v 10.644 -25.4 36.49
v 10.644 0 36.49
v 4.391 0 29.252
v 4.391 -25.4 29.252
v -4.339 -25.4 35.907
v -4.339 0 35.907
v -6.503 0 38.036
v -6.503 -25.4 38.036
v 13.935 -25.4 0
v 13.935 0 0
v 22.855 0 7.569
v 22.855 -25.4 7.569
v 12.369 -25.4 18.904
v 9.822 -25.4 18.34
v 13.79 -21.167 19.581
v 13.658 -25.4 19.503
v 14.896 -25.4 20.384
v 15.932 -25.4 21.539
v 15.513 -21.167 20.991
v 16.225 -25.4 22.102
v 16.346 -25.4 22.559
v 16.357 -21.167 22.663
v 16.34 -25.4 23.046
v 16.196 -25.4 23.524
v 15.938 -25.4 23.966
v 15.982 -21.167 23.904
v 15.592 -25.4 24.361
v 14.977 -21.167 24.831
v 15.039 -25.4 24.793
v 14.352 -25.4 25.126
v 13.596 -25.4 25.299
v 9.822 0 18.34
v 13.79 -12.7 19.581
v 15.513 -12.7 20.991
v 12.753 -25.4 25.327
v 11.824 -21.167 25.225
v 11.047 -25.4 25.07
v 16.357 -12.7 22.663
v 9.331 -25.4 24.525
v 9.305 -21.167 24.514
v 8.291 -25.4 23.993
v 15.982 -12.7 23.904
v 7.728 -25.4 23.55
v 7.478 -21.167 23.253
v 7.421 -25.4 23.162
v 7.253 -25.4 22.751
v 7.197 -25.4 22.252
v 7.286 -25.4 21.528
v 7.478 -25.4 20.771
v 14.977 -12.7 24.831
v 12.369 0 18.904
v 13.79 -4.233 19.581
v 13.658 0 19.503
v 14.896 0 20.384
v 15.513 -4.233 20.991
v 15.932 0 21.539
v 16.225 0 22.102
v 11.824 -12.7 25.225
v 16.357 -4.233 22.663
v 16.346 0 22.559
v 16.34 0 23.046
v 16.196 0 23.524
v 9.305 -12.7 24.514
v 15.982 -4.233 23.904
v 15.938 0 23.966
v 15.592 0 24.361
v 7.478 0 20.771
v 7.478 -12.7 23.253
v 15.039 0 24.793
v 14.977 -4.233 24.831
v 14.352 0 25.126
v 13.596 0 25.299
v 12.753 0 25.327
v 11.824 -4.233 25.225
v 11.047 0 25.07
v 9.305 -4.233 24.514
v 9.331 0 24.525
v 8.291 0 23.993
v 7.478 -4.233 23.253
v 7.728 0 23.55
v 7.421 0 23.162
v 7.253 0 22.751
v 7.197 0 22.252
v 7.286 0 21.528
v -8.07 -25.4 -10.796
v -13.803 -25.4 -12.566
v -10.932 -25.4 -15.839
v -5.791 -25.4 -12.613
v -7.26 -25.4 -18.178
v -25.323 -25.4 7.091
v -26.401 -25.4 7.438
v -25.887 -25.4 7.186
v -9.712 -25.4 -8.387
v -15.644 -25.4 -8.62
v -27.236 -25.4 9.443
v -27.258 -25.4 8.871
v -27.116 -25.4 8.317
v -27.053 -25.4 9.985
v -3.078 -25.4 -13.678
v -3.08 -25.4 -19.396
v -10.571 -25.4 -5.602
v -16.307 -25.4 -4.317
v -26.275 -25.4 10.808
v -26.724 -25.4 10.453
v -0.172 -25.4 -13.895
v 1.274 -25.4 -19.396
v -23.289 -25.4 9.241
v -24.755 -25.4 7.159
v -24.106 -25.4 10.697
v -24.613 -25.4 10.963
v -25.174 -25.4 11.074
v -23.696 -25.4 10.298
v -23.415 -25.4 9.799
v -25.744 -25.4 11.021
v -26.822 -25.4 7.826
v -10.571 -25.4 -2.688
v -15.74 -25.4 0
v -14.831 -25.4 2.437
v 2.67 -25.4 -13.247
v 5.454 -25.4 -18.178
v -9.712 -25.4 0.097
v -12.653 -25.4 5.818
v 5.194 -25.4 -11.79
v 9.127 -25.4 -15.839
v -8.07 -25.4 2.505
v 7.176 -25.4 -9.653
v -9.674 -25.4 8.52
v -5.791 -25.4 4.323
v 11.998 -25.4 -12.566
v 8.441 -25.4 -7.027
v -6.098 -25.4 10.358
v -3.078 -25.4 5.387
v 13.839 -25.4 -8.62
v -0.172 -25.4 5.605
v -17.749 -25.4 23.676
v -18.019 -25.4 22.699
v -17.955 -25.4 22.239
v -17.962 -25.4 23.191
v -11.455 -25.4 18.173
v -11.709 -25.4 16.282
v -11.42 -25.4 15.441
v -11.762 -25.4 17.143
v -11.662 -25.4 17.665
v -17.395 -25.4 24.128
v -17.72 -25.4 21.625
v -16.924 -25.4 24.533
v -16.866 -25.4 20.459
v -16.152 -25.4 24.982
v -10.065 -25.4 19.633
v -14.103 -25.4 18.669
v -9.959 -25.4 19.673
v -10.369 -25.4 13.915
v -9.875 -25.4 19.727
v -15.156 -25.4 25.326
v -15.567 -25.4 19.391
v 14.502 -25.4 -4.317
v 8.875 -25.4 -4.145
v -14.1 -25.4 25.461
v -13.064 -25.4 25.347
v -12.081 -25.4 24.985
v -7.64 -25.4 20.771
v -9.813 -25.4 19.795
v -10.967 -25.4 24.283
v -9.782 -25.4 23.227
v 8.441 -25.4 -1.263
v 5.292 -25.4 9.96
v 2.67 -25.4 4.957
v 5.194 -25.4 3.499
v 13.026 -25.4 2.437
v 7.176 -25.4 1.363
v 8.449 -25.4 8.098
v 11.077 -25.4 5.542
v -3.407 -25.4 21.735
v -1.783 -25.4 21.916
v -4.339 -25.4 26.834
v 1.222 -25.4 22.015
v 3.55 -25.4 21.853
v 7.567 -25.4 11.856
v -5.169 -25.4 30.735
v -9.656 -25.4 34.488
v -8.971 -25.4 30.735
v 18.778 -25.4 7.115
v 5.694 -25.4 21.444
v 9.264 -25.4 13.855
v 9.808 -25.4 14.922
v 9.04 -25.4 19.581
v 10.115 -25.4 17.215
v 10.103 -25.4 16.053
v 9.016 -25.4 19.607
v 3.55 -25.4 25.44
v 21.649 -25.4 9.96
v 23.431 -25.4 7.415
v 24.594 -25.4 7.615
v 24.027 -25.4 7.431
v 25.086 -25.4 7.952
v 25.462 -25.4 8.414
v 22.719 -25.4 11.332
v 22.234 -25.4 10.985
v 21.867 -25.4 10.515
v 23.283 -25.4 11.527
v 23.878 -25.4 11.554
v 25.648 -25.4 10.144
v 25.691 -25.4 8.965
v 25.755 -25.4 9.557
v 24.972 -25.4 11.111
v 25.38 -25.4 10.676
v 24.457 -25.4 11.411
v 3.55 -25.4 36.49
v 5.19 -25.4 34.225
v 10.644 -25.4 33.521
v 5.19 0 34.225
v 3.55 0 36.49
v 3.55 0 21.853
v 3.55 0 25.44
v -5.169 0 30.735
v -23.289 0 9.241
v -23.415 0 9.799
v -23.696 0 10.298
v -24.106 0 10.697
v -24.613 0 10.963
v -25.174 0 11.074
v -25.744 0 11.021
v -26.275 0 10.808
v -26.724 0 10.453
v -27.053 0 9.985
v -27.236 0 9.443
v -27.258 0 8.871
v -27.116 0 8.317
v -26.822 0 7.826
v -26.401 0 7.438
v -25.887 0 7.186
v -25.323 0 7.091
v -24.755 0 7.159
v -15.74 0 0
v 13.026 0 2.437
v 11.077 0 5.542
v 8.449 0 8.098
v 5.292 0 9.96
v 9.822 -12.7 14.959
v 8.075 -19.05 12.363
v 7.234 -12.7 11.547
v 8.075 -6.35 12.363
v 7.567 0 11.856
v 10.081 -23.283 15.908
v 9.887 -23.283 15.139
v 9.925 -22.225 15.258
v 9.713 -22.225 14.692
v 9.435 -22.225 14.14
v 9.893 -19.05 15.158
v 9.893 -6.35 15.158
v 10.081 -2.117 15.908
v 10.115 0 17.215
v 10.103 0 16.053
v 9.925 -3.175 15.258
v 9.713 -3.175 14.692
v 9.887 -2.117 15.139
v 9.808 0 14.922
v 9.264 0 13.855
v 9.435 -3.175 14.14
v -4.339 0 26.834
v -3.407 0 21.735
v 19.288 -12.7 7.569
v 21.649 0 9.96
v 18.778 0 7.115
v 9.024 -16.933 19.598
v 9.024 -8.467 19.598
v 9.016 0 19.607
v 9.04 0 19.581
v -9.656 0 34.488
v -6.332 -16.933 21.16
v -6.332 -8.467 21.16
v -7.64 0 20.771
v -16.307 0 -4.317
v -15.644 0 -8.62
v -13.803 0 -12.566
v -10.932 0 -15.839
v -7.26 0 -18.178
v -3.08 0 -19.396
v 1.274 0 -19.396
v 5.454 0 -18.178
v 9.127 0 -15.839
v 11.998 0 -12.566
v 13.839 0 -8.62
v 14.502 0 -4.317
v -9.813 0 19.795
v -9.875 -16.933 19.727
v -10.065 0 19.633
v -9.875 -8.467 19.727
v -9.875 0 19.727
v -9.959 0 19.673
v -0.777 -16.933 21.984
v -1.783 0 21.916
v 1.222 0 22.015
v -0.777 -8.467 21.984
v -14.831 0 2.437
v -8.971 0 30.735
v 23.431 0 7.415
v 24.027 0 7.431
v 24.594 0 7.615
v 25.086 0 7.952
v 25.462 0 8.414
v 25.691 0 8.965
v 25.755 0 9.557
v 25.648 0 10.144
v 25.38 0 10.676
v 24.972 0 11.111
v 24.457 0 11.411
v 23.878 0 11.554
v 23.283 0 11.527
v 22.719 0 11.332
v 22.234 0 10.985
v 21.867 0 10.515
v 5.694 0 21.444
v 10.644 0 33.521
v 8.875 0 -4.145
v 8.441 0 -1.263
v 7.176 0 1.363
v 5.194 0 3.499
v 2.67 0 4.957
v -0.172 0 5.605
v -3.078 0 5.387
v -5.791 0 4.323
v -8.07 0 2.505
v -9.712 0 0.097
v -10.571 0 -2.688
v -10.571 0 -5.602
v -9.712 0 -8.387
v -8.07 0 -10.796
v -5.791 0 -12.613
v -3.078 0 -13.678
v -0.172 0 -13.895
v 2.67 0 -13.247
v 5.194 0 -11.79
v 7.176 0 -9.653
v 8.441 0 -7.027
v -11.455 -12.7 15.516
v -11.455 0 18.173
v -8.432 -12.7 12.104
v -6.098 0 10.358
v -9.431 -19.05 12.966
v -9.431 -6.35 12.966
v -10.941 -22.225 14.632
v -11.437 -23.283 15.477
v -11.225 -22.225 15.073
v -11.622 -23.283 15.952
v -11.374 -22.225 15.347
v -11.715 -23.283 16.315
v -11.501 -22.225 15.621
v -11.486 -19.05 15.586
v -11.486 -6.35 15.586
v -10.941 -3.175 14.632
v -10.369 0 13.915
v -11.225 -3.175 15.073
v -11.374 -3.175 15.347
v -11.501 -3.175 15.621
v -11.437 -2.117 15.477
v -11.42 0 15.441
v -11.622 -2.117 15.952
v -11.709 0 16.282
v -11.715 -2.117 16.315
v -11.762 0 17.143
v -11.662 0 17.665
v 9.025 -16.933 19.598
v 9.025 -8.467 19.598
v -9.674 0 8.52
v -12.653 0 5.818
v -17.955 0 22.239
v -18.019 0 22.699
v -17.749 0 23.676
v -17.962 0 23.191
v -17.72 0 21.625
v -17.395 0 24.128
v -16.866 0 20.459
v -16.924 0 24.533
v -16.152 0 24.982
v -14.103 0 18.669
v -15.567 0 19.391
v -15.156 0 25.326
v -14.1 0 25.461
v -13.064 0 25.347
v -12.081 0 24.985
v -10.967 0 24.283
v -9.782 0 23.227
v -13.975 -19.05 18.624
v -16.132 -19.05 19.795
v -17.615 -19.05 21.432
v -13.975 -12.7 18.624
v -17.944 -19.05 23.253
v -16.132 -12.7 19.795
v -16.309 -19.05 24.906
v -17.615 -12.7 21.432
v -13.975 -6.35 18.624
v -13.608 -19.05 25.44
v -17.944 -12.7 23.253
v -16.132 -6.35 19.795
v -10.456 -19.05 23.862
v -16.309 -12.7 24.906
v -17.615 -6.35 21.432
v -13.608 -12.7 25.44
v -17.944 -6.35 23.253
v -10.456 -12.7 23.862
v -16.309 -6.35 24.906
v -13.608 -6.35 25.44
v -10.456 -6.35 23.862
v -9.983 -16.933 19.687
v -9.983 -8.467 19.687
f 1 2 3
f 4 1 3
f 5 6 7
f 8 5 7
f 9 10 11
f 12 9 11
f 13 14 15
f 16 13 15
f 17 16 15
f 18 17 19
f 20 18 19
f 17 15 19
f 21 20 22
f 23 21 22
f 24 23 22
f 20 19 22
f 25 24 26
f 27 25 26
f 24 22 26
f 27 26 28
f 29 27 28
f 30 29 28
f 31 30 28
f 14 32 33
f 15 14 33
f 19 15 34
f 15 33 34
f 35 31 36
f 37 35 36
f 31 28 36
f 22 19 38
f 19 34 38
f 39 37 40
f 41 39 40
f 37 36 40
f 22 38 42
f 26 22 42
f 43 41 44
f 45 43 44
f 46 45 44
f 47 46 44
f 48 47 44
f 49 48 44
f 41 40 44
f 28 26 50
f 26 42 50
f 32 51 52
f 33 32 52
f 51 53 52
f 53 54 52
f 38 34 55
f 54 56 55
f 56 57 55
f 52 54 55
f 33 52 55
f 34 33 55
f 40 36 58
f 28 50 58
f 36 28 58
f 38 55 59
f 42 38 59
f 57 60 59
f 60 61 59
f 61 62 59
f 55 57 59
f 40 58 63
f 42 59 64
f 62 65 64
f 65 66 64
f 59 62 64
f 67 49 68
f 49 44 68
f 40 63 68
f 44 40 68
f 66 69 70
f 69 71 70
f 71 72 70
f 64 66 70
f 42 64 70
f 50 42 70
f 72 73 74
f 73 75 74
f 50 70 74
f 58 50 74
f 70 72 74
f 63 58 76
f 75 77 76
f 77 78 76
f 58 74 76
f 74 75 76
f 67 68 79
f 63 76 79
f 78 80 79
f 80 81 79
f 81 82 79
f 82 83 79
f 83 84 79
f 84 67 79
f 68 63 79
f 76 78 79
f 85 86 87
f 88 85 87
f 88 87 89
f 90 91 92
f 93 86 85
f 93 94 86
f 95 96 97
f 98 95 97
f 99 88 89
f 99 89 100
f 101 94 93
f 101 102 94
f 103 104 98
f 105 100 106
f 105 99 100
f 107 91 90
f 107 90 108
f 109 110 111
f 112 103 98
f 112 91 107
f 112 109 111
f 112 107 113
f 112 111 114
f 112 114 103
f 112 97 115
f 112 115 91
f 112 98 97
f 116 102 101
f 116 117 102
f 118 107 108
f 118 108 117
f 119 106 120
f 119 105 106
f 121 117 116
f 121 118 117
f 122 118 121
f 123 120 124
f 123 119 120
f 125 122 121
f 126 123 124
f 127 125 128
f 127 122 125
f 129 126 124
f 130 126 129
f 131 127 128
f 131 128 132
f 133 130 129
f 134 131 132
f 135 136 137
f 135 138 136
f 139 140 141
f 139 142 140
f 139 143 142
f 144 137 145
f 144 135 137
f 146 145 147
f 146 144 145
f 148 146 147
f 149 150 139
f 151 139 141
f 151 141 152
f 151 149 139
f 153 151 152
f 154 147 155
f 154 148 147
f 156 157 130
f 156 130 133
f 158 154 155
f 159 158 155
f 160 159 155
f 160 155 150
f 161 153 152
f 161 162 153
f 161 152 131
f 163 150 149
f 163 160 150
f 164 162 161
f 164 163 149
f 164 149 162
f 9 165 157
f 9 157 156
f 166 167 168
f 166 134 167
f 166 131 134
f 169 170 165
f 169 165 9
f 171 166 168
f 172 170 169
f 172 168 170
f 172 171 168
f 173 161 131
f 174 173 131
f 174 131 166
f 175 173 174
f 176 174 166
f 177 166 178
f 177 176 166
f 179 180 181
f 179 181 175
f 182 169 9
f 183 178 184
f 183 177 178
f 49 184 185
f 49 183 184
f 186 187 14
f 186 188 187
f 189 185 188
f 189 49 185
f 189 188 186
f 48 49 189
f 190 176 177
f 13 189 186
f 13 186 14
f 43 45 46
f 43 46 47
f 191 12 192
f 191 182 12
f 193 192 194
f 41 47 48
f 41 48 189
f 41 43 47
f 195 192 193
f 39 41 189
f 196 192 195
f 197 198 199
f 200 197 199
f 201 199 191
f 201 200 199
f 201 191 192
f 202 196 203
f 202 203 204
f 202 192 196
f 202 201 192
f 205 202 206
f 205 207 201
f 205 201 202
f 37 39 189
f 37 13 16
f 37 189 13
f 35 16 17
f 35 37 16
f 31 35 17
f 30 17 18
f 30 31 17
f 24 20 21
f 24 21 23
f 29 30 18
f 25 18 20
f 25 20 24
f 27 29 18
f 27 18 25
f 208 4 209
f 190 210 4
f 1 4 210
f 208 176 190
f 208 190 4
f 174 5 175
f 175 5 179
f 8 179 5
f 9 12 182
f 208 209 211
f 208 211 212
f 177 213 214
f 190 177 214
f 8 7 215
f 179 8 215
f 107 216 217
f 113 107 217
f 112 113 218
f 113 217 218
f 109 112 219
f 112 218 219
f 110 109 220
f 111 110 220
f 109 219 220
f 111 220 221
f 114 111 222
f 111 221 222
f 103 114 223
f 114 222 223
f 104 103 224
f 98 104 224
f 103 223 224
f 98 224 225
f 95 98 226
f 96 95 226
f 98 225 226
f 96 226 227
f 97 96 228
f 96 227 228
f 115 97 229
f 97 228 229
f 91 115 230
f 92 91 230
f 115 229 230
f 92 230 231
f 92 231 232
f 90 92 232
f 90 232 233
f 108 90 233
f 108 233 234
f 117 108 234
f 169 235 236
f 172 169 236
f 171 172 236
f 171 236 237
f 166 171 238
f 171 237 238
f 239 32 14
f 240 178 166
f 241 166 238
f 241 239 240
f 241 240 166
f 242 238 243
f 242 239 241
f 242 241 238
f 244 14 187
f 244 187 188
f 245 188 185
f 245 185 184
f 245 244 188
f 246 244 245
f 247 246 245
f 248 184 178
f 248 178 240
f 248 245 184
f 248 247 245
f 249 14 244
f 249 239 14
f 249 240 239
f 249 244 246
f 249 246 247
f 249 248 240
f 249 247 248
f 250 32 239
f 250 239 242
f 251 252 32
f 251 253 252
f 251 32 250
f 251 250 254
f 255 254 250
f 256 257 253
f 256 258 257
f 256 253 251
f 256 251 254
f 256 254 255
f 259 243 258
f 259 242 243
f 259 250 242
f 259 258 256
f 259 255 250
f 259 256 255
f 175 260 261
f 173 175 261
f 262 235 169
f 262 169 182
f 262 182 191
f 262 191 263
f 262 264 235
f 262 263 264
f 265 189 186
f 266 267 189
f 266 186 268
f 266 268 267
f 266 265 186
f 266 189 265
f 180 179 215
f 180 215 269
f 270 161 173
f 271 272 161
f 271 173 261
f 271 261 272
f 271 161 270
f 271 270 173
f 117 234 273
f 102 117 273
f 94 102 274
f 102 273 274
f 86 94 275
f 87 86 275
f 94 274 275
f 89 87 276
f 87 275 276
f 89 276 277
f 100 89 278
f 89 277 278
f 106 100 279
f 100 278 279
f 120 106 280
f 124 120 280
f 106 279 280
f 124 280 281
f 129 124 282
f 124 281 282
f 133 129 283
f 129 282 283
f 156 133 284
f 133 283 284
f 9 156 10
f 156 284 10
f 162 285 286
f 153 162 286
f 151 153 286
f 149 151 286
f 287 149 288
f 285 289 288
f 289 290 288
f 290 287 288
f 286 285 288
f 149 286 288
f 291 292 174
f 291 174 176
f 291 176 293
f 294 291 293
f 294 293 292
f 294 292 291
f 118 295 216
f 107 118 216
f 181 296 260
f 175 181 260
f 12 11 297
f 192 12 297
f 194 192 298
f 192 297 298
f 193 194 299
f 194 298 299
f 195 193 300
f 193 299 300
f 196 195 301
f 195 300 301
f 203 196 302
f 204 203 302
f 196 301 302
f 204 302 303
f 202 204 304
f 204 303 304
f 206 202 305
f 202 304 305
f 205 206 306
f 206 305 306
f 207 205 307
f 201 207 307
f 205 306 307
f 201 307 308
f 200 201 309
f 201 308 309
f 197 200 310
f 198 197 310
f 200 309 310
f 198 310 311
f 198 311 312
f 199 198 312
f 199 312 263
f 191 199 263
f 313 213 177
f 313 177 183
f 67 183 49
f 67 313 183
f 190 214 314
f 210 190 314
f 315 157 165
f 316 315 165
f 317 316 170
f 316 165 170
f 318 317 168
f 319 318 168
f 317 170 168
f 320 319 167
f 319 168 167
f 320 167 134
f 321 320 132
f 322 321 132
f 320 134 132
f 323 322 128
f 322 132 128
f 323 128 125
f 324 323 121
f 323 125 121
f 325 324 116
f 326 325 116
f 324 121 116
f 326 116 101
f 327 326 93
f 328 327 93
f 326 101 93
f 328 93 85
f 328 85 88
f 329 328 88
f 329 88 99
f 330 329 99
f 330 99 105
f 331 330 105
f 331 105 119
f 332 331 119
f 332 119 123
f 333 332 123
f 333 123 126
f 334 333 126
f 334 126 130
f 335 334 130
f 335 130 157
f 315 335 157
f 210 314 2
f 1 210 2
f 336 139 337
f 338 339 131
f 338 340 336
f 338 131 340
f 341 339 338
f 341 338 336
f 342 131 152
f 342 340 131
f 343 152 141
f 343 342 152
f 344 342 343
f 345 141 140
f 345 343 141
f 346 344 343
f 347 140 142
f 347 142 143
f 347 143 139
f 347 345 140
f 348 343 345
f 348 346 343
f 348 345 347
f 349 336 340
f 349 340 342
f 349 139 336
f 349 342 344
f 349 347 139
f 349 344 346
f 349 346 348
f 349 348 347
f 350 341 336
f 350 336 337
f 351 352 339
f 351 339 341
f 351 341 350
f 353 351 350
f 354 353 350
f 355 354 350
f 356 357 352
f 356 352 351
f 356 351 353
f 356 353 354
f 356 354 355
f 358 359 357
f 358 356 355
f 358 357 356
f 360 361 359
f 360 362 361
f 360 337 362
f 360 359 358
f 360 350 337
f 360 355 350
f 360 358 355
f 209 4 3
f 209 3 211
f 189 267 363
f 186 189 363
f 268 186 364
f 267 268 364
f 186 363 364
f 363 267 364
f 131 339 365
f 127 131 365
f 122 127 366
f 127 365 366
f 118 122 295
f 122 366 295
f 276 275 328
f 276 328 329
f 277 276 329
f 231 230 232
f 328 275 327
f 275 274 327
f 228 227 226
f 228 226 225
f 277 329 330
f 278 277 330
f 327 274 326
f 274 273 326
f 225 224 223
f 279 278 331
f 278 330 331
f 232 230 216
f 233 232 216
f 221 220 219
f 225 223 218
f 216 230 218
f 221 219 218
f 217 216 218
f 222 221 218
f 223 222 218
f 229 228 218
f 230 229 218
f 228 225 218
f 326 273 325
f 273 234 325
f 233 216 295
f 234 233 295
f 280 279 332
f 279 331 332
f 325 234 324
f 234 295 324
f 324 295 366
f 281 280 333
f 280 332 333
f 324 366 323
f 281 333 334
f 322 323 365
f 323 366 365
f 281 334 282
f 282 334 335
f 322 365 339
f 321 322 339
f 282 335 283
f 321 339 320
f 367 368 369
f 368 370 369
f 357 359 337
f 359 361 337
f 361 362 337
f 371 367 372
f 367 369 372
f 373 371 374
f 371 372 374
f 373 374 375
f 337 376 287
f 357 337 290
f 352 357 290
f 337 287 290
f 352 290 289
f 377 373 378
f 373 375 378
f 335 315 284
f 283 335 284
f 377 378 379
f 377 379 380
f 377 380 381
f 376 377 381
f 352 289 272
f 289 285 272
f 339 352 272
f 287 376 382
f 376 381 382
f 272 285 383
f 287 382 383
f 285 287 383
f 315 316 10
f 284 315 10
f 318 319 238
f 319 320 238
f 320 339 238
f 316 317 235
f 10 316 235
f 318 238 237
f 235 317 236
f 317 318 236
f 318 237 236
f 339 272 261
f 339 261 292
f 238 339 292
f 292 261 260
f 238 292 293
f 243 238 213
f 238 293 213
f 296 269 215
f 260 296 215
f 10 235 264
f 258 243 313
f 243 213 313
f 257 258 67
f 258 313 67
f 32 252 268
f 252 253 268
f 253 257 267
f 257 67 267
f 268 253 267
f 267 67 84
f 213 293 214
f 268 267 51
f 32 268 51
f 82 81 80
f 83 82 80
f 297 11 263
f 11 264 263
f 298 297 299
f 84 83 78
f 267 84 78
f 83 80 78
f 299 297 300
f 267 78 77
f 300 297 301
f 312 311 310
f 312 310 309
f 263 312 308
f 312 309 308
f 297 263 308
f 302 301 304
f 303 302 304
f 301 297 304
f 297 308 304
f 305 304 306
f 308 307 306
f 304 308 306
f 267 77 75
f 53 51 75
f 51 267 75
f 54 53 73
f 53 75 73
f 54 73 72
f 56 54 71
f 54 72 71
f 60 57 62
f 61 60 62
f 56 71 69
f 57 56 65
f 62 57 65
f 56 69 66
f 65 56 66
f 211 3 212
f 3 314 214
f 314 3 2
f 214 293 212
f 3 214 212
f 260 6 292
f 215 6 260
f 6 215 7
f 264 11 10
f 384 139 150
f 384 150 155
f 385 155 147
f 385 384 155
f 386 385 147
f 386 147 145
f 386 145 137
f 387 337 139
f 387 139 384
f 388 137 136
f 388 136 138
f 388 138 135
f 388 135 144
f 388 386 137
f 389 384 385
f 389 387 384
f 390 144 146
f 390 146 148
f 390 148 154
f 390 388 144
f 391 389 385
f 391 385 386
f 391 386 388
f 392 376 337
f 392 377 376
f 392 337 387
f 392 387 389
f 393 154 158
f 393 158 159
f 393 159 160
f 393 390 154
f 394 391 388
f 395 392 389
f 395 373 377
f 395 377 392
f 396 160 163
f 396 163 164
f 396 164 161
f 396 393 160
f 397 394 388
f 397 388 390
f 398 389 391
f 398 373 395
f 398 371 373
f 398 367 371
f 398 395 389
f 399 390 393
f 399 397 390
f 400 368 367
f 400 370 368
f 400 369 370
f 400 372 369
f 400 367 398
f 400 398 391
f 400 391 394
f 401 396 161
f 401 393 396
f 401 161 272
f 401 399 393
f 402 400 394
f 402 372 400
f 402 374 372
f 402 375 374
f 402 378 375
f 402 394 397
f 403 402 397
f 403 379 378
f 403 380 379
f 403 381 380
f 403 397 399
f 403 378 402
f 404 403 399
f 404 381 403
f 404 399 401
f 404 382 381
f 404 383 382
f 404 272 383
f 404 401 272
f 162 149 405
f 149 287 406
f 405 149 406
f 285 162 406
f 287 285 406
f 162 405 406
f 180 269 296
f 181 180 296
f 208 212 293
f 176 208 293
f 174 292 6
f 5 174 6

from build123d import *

# Parameters (mm, degrees)
F0_R     = 1.2343431581
F0_R_2   = 1.1676202912
F1_DEPTH = 25.4
F2_R     = 9.777673903
F3_DEPTH = 25.4010001


# Not quite as in the source:
# - a feature names something its author has since deleted; it is built from what else it names


with BuildPart() as f1:
    # F0 (on Front) → F1 (new body)
    with BuildSketch(Plane.XZ):
        with BuildLine():
            ThreePointArc((-1.9968199656, 7.5688475417), (0, 9.5656675073), (1.9968199656, 7.5688475417))
            add(Edge.make_bspline(
                [(3.2633473205, 8.4793044276), (2.841689417, 8.1773369558), (2.417681238, 7.8743128728), (1.9968199656, 7.5688475417)],
                knots=[0.9731401377, 0.9731401377, 0.9731401377, 0.9731401377, 1, 1, 1, 1], degree=3))
            add(Edge.make_bspline(
                [(5.291820418, 9.9603919059), (4.6380599048, 9.4654757695), (3.9538550257, 8.9738068766), (3.2633473205, 8.4793044276)],
                knots=[0.9291543812, 0.9291543812, 0.9291543812, 0.9291543812, 0.9731401377, 0.9731401377, 0.9731401377, 0.9731401377], degree=3))
            add(Edge.make_bspline(
                [(9.8224105557, 18.3403169376), (10.2657515128, 17.2671971534), (10.2057973933, 14.1054721398), (7.3643949931, 11.5293924505), (5.291820418, 9.9603919059)],
                knots=[0.7048700925, 0.7048700925, 0.7048700925, 0.7048700925, 0.7897091886, 0.9291543812, 0.9291543812, 0.9291543812, 0.9291543812], degree=3))
            add(Edge.make_bspline(
                [(9.0404523602, 19.5806321203), (9.3820768283, 19.1971335676), (9.6411804083, 18.7789898223), (9.8224105557, 18.3403169376)],
                knots=[0.6701893312, 0.6701893312, 0.6701893312, 0.6701893312, 0.7048700925, 0.7048700925, 0.7048700925, 0.7048700925], degree=3))
            add(Edge.make_bspline(
                [(9.0164794626, 19.6073366215), (9.0241449488, 19.5979806062), (9.0321349993, 19.5890743409), (9.0404523602, 19.5806321203)],
                knots=[0.9951430193, 0.9951430193, 0.9951430193, 0.9951430193, 1, 1, 1, 1], degree=3))
            add(Edge.make_bspline(
                [(7.4781377275, 20.7706270595), (8.1063529664, 20.4442707486), (8.6167334364, 20.0492172461), (9.0164794626, 19.6073366215)],
                knots=[0.6292527912, 0.6292527912, 0.6292527912, 0.6292527912, 0.6693826452, 0.6693826452, 0.6693826452, 0.6693826452], degree=3))
            add(Edge.make_bspline(
                [(3.5498395186, 21.8525875291), (5.0709035737, 21.6640168859), (6.4365000788, 21.3117553214), (7.4781377275, 20.7706270595)],
                knots=[0.562713866, 0.562713866, 0.562713866, 0.562713866, 0.6292527912, 0.6292527912, 0.6292527912, 0.6292527912], degree=3))
            add(Edge.make_bspline(
                [(1.2218726617, 22.0148384046), (2.0219718496, 21.9980775903), (2.8045671105, 21.9449810722), (3.5498395186, 21.8525875291)],
                knots=[0.5301119353, 0.5301119353, 0.5301119353, 0.5301119353, 0.562713866, 0.562713866, 0.562713866, 0.562713866], degree=3))
            add(Edge.make_bspline(
                [(-1.7825967517, 21.9164786942), (-0.7792787738, 22.0008787252), (0.2346221093, 22.0355197444), (1.2218726617, 22.0148384046)],
                knots=[0.4898840803, 0.4898840803, 0.4898840803, 0.4898840803, 0.5301119353, 0.5301119353, 0.5301119353, 0.5301119353], degree=3))
            add(Edge.make_bspline(
                [(-3.4071633919, 21.7351022024), (-2.8727981588, 21.8097333743), (-2.3292683633, 21.8704921755), (-1.7825967517, 21.9164786942)],
                knots=[0.4679653797, 0.4679653797, 0.4679653797, 0.4679653797, 0.4898840803, 0.4898840803, 0.4898840803, 0.4898840803], degree=3))
            add(Edge.make_bspline(
                [(-7.6403221771, 20.7706270595), (-6.3998054208, 21.1922572452), (-4.9412508039, 21.5208466068), (-3.4071633919, 21.7351022024)],
                knots=[0.4050398738, 0.4050398738, 0.4050398738, 0.4050398738, 0.4679653797, 0.4679653797, 0.4679653797, 0.4679653797], degree=3))
            add(Edge.make_bspline(
                [(-9.8129768452, 19.7946945944), (-9.2177162529, 20.158130564), (-8.4788283728, 20.4856333089), (-7.6403221771, 20.7706270595)],
                knots=[0.3625064487, 0.3625064487, 0.3625064487, 0.3625064487, 0.4050398738, 0.4050398738, 0.4050398738, 0.4050398738], degree=3))
            add(Edge.make_bspline(
                [(-9.8129768452, 19.7946945944), (-9.8626572034, 19.7193909877), (-9.9490587456, 19.6661416758), (-10.0647194767, 19.6331309022)],
                knots=[0, 0, 0, 0, 0.0391866891, 0.0391866891, 0.0391866891, 0.0391866891], degree=3))
            add(Edge.make_bspline(
                [(-11.4547769714, 18.1728920256), (-11.1799307011, 18.6961641136), (-10.722667508, 19.1889237515), (-10.0647194767, 19.6331309022)],
                knots=[0.3057347726, 0.3057347726, 0.3057347726, 0.3057347726, 0.3562922319, 0.3562922319, 0.3562922319, 0.3562922319], degree=3))
            add(Edge.make_bspline(
                [(-6.0977533046, 10.3582262113), (-8.6062536302, 12.1230052446), (-11.8222803026, 14.7501658532), (-11.892115865, 17.3402547999), (-11.4547769714, 18.1728920256)],
                knots=[0.0767336432, 0.0767336432, 0.0767336432, 0.0767336432, 0.2252870982, 0.3057347726, 0.3057347726, 0.3057347726, 0.3057347726], degree=3))
            add(Edge.make_bspline(
                [(-3.9700187942, 8.9003053831), (-4.698469629, 9.3913862847), (-5.4138065645, 9.877056305), (-6.0977533046, 10.3582262113)],
                knots=[0.0362302993, 0.0362302993, 0.0362302993, 0.0362302993, 0.0767336432, 0.0767336432, 0.0767336432, 0.0767336432], degree=3))
            add(Edge.make_bspline(
                [(-1.9968199656, 7.5688475417), (-2.6563252964, 8.0174308154), (-3.3184184759, 8.4610328111), (-3.9700187942, 8.9003053831)],
                knots=[0, 0, 0, 0, 0.0362302993, 0.0362302993, 0.0362302993, 0.0362302993], degree=3))
        make_face()
        with Locations((-2.5474067745, 12.413466867)):
            Circle(F0_R, mode=Mode.SUBTRACT)
        with Locations((1.6244133145, 12.2344455942)):
            Circle(F0_R_2, mode=Mode.SUBTRACT)
        with BuildLine():
            ThreePointArc((-1.9968199656, 7.5688475417), (0, 5.5720275761), (1.9968199656, 7.5688475417))
            ThreePointArc((1.9968199656, 7.5688475417), (0, 9.5656675073), (-1.9968199656, 7.5688475417))
        make_face()
        with BuildLine():
            add(Edge.make_bspline(
                [(-11.4547769714, 18.1728920256), (-13.2618411574, 18.2583922451), (-16.1819405075, 19.1885835024), (-19.4228561636, 23.6007697874), (-12.8090262125, 26.9600135992), (-9.4729623186, 23.020656954), (-7.6403221771, 20.7706270595)],
                knots=[0, 0, 0, 0, 0.2429778163, 0.4587446686, 0.6993896075, 1, 1, 1, 1], degree=3))
            add(Edge.make_bspline(
                [(-11.4547769714, 18.1728920256), (-11.1799307011, 18.6961641136), (-10.722667508, 19.1889237515), (-10.0647194767, 19.6331309022)],
                knots=[0.3057347726, 0.3057347726, 0.3057347726, 0.3057347726, 0.3562922319, 0.3562922319, 0.3562922319, 0.3562922319], degree=3))
            add(Edge.make_bspline(
                [(-10.0647194767, 19.6331309022), (-10.7420183544, 19.4398227702), (-14.127166026, 20.448341035), (-16.206710897, 23.9906258668), (-11.9787863154, 23.137781592), (-9.4800821705, 20.299283743), (-9.8129768452, 19.7946945944)],
                knots=[0.0391866891, 0.0391866891, 0.0391866891, 0.0391866891, 0.2686604293, 0.5013914501, 0.7374205704, 1, 1, 1, 1], degree=3))
            add(Edge.make_bspline(
                [(-9.8129768452, 19.7946945944), (-9.2177162529, 20.158130564), (-8.4788283728, 20.4856333089), (-7.6403221771, 20.7706270595)],
                knots=[0.3625064487, 0.3625064487, 0.3625064487, 0.3625064487, 0.4050398738, 0.4050398738, 0.4050398738, 0.4050398738], degree=3))
        make_face()
        with BuildLine():
            Line((-4.3387768686, 26.8339979934), (-3.4071633919, 21.7351022024))
            add(Edge.make_bspline(
                [(-3.4071633919, 21.7351022024), (-2.8727981588, 21.8097333743), (-2.3292683633, 21.8704921755), (-1.7825967517, 21.9164786942)],
                knots=[0.4679653797, 0.4679653797, 0.4679653797, 0.4679653797, 0.4898840803, 0.4898840803, 0.4898840803, 0.4898840803], degree=3))
            Line((-1.7825967517, 21.9164786942), (-4.3387768686, 35.9069332823))
            Line((-4.3387768686, 35.9069332823), (-6.5032765269, 38.0355417728))
            Line((-6.5032765269, 38.0355417728), (-5.1694188174, 30.7350876349))
            Line((-5.1694188174, 30.7350876349), (-9.6563799307, 34.4880223274))
            Line((-9.6563799307, 34.4880223274), (-8.9706854823, 30.7350876349))
            Line((-8.9706854823, 30.7350876349), (-4.3387768686, 26.8339979934))
        make_face()
        with BuildLine():
            add(Edge.make_bspline(
                [(-10.0647194767, 19.6331309022), (-10.7420183544, 19.4398227702), (-14.127166026, 20.448341035), (-16.206710897, 23.9906258668), (-11.9787863154, 23.137781592), (-9.4800821705, 20.299283743), (-9.8129768452, 19.7946945944)],
                knots=[0.0391866891, 0.0391866891, 0.0391866891, 0.0391866891, 0.2686604293, 0.5013914501, 0.7374205704, 1, 1, 1, 1], degree=3))
            add(Edge.make_bspline(
                [(-10.0647194767, 19.6331309022), (-9.9838484879, 19.687730156), (-9.899945585, 19.7415958866), (-9.8129768452, 19.7946945944)],
                knots=[0.3562922319, 0.3562922319, 0.3562922319, 0.3562922319, 0.3625064487, 0.3625064487, 0.3625064487, 0.3625064487], degree=3))
        make_face()
        with BuildLine():
            add(Edge.make_bspline(
                [(1.2218726617, 22.0148384046), (2.0219718496, 21.9980775903), (2.8045671105, 21.9449810722), (3.5498395186, 21.8525875291)],
                knots=[0.5301119353, 0.5301119353, 0.5301119353, 0.5301119353, 0.562713866, 0.562713866, 0.562713866, 0.562713866], degree=3))
            Line((3.5498395186, 21.8525875291), (3.5498395186, 25.4404416609))
            Line((3.5498395186, 25.4404416609), (10.6439810566, 33.5208887535))
            Line((10.6439810566, 33.5208887535), (10.6439810566, 36.4897335443))
            Line((10.6439810566, 36.4897335443), (4.3906857101, 29.2522859745))
            Line((4.3906857101, 29.2522859745), (5.1904305148, 34.224960801))
            Line((5.1904305148, 34.224960801), (3.5498395186, 36.4897335443))
            Line((3.5498395186, 36.4897335443), (1.2218726617, 22.0148384046))
        make_face()
        with BuildLine():
            add(Edge.make_bspline(
                [(9.0404523602, 19.5806321203), (9.3820768283, 19.1971335676), (9.6411804083, 18.7789898223), (9.8224105557, 18.3403169376)],
                knots=[0.6701893312, 0.6701893312, 0.6701893312, 0.6701893312, 0.7048700925, 0.7048700925, 0.7048700925, 0.7048700925], degree=3))
            add(Edge.make_bspline(
                [(9.8224105557, 18.3403169376), (11.2153140722, 18.5109801218), (13.7892848388, 19.1004981723), (17.2606461127, 22.5302099032), (15.0050826028, 25.2706081918), (11.9173641085, 25.5467387461), (6.6576478669, 23.7334481834), (7.2324744651, 21.6701568434), (7.4781377275, 20.7706270595)],
                knots=[0, 0, 0, 0, 0.1822400506, 0.3612657036, 0.5045524169, 0.663892651, 0.8591676122, 1, 1, 1, 1], degree=3))
            add(Edge.make_bspline(
                [(7.4781377275, 20.7706270595), (8.1063529664, 20.4442707486), (8.6167334364, 20.0492172461), (9.0164794626, 19.6073366215)],
                knots=[0.6292527912, 0.6292527912, 0.6292527912, 0.6292527912, 0.6693826452, 0.6693826452, 0.6693826452, 0.6693826452], degree=3))
            add(Edge.make_bspline(
                [(9.0404523602, 19.5806321203), (9.4784020758, 19.1361079274), (12.0293402458, 20.7326500765), (13.9949567764, 23.4997662714), (9.668194415, 23.7104945441), (8.5939298141, 20.1230744252), (9.0164794626, 19.6073366215)],
                knots=[0, 0, 0, 0, 0.255743784, 0.4848908681, 0.7274084652, 0.9951430193, 0.9951430193, 0.9951430193, 0.9951430193], degree=3))
        make_face()
        with BuildLine():
            add(Edge.make_bspline(
                [(9.0164794626, 19.6073366215), (9.0245151148, 19.598453984), (9.0325060612, 19.5895524244), (9.0404523602, 19.5806321203)],
                knots=[0.6693826452, 0.6693826452, 0.6693826452, 0.6693826452, 0.6701893312, 0.6701893312, 0.6701893312, 0.6701893312], degree=3))
            add(Edge.make_bspline(
                [(9.0404523602, 19.5806321203), (9.4784020758, 19.1361079274), (12.0293402458, 20.7326500765), (13.9949567764, 23.4997662714), (9.668194415, 23.7104945441), (8.5939298141, 20.1230744252), (9.0164794626, 19.6073366215)],
                knots=[0, 0, 0, 0, 0.255743784, 0.4848908681, 0.7274084652, 0.9951430193, 0.9951430193, 0.9951430193, 0.9951430193], degree=3))
        make_face()
        with Locations((1.6244133145, 12.2344455942)):
            Circle(F0_R_2)
        with Locations((-2.5474067745, 12.413466867)):
            Circle(F0_R)
        with BuildLine():
            add(Edge.make_bspline(
                [(3.2633473205, 8.4793044276), (2.841689417, 8.1773369558), (2.417681238, 7.8743128728), (1.9968199656, 7.5688475417)],
                knots=[0.9731401377, 0.9731401377, 0.9731401377, 0.9731401377, 1, 1, 1, 1], degree=3))
            ThreePointArc((1.9968199656, 7.5688475417), (0, 5.5720275761), (-1.9968199656, 7.5688475417))
            add(Edge.make_bspline(
                [(-1.9968199656, 7.5688475417), (-2.6563252964, 8.0174308154), (-3.3184184759, 8.4610328111), (-3.9700187942, 8.9003053831)],
                knots=[0, 0, 0, 0, 0.0362302993, 0.0362302993, 0.0362302993, 0.0362302993], degree=3))
            add(Edge.make_bspline(
                [(-3.9700187942, 8.9003053831), (-6.9902118362, 5.8201430862), (-12.8862109887, 0.4369124192), (-11.7946728285, -6.7063142641), (-9.2590422156, -17.5990966335), (-6.1766836432, -4.8008390766), (-1.1883774497, -21.4983309099), (-1.4966768799, -5.6799294478), (8.3885389188, -20.2079907911), (4.1770733312, -2.7890633953), (11.961574095, -14.0816381699), (8.986776897, -0.572525648), (13.2777598832, -8.0107441312), (11.4445848325, 4.674510475), (6.1620931725, 7.1594239129), (3.2633473205, 8.4793044276)],
                knots=[0, 0, 0, 0, 0.1016288045, 0.1850105958, 0.2605805278, 0.3277901899, 0.4097509261, 0.481040342, 0.5604810392, 0.6410163658, 0.7044948285, 0.7793548179, 0.825264206, 0.9078715102, 1, 1, 1, 1], degree=3))
        make_face()
        with BuildLine():
            add(Edge.make_bspline(
                [(5.291820418, 9.9603919059), (4.6380599048, 9.4654757695), (3.9538550257, 8.9738068766), (3.2633473205, 8.4793044276)],
                knots=[0.9291543812, 0.9291543812, 0.9291543812, 0.9291543812, 0.9731401377, 0.9731401377, 0.9731401377, 0.9731401377], degree=3))
            add(Edge.make_bspline(
                [(-3.9700187942, 8.9003053831), (-6.9902118362, 5.8201430862), (-12.8862109887, 0.4369124192), (-11.7946728285, -6.7063142641), (-9.2590422156, -17.5990966335), (-6.1766836432, -4.8008390766), (-1.1883774497, -21.4983309099), (-1.4966768799, -5.6799294478), (8.3885389188, -20.2079907911), (4.1770733312, -2.7890633953), (11.961574095, -14.0816381699), (8.986776897, -0.572525648), (13.2777598832, -8.0107441312), (11.4445848325, 4.674510475), (6.1620931725, 7.1594239129), (3.2633473205, 8.4793044276)],
                knots=[0, 0, 0, 0, 0.1016288045, 0.1850105958, 0.2605805278, 0.3277901899, 0.4097509261, 0.481040342, 0.5604810392, 0.6410163658, 0.7044948285, 0.7793548179, 0.825264206, 0.9078715102, 1, 1, 1, 1], degree=3))
            add(Edge.make_bspline(
                [(-3.9700187942, 8.9003053831), (-4.698469629, 9.3913862847), (-5.4138065645, 9.877056305), (-6.0977533046, 10.3582262113)],
                knots=[0.0362302993, 0.0362302993, 0.0362302993, 0.0362302993, 0.0767336432, 0.0767336432, 0.0767336432, 0.0767336432], degree=3))
            ThreePointArc((-6.0977533046, 10.3582262113), (-11.2522703526, 7.2663125794), (-14.8312818353, 2.4372699504))
            Line((-14.8312818353, 2.4372699504), (-23.2887535927, 9.2411445911))
            ThreePointArc((-23.2887535927, 9.2411445911), (-26.9055674019, 10.2310859611), (-24.7547028528, 7.1594239129))
            Line((-24.7547028528, 7.1594239129), (-15.7401796902, 0))
            ThreePointArc((-15.7401796902, 0), (-0.9026138185, -19.5507430015), (13.9349520533, 0))
            Line((13.9349520533, 0), (22.8549973194, 7.5688475417))
            ThreePointArc((22.8549973194, 7.5688475417), (25.5333188907, 10.4197188603), (21.6487478123, 9.9603919059))
            add(Edge.make_bspline(
                [(13.0260541983, 2.4372699504), (15.3164169129, 4.298441963), (19.2653346729, 7.3244846795), (20.9658887146, 9.2411445911), (21.6487478123, 9.9603919059)],
                knots=[0, 0, 0, 0, 0.6081778742, 1, 1, 1, 1], degree=3))
            ThreePointArc((13.0260541983, 2.4372699504), (9.8390877256, 6.8980675437), (5.291820418, 9.9603919059))
        make_face()
    extrude(amount=F1_DEPTH)

    # F2 (on face) → F3 (cut, through all)
    with BuildSketch(Plane.XZ.offset(25.4)):
        with Locations((-0.9026138185, -4.14506474)):
            Circle(F2_R)
    extrude(amount=-F3_DEPTH, mode=Mode.SUBTRACT)


solid = f1.part
